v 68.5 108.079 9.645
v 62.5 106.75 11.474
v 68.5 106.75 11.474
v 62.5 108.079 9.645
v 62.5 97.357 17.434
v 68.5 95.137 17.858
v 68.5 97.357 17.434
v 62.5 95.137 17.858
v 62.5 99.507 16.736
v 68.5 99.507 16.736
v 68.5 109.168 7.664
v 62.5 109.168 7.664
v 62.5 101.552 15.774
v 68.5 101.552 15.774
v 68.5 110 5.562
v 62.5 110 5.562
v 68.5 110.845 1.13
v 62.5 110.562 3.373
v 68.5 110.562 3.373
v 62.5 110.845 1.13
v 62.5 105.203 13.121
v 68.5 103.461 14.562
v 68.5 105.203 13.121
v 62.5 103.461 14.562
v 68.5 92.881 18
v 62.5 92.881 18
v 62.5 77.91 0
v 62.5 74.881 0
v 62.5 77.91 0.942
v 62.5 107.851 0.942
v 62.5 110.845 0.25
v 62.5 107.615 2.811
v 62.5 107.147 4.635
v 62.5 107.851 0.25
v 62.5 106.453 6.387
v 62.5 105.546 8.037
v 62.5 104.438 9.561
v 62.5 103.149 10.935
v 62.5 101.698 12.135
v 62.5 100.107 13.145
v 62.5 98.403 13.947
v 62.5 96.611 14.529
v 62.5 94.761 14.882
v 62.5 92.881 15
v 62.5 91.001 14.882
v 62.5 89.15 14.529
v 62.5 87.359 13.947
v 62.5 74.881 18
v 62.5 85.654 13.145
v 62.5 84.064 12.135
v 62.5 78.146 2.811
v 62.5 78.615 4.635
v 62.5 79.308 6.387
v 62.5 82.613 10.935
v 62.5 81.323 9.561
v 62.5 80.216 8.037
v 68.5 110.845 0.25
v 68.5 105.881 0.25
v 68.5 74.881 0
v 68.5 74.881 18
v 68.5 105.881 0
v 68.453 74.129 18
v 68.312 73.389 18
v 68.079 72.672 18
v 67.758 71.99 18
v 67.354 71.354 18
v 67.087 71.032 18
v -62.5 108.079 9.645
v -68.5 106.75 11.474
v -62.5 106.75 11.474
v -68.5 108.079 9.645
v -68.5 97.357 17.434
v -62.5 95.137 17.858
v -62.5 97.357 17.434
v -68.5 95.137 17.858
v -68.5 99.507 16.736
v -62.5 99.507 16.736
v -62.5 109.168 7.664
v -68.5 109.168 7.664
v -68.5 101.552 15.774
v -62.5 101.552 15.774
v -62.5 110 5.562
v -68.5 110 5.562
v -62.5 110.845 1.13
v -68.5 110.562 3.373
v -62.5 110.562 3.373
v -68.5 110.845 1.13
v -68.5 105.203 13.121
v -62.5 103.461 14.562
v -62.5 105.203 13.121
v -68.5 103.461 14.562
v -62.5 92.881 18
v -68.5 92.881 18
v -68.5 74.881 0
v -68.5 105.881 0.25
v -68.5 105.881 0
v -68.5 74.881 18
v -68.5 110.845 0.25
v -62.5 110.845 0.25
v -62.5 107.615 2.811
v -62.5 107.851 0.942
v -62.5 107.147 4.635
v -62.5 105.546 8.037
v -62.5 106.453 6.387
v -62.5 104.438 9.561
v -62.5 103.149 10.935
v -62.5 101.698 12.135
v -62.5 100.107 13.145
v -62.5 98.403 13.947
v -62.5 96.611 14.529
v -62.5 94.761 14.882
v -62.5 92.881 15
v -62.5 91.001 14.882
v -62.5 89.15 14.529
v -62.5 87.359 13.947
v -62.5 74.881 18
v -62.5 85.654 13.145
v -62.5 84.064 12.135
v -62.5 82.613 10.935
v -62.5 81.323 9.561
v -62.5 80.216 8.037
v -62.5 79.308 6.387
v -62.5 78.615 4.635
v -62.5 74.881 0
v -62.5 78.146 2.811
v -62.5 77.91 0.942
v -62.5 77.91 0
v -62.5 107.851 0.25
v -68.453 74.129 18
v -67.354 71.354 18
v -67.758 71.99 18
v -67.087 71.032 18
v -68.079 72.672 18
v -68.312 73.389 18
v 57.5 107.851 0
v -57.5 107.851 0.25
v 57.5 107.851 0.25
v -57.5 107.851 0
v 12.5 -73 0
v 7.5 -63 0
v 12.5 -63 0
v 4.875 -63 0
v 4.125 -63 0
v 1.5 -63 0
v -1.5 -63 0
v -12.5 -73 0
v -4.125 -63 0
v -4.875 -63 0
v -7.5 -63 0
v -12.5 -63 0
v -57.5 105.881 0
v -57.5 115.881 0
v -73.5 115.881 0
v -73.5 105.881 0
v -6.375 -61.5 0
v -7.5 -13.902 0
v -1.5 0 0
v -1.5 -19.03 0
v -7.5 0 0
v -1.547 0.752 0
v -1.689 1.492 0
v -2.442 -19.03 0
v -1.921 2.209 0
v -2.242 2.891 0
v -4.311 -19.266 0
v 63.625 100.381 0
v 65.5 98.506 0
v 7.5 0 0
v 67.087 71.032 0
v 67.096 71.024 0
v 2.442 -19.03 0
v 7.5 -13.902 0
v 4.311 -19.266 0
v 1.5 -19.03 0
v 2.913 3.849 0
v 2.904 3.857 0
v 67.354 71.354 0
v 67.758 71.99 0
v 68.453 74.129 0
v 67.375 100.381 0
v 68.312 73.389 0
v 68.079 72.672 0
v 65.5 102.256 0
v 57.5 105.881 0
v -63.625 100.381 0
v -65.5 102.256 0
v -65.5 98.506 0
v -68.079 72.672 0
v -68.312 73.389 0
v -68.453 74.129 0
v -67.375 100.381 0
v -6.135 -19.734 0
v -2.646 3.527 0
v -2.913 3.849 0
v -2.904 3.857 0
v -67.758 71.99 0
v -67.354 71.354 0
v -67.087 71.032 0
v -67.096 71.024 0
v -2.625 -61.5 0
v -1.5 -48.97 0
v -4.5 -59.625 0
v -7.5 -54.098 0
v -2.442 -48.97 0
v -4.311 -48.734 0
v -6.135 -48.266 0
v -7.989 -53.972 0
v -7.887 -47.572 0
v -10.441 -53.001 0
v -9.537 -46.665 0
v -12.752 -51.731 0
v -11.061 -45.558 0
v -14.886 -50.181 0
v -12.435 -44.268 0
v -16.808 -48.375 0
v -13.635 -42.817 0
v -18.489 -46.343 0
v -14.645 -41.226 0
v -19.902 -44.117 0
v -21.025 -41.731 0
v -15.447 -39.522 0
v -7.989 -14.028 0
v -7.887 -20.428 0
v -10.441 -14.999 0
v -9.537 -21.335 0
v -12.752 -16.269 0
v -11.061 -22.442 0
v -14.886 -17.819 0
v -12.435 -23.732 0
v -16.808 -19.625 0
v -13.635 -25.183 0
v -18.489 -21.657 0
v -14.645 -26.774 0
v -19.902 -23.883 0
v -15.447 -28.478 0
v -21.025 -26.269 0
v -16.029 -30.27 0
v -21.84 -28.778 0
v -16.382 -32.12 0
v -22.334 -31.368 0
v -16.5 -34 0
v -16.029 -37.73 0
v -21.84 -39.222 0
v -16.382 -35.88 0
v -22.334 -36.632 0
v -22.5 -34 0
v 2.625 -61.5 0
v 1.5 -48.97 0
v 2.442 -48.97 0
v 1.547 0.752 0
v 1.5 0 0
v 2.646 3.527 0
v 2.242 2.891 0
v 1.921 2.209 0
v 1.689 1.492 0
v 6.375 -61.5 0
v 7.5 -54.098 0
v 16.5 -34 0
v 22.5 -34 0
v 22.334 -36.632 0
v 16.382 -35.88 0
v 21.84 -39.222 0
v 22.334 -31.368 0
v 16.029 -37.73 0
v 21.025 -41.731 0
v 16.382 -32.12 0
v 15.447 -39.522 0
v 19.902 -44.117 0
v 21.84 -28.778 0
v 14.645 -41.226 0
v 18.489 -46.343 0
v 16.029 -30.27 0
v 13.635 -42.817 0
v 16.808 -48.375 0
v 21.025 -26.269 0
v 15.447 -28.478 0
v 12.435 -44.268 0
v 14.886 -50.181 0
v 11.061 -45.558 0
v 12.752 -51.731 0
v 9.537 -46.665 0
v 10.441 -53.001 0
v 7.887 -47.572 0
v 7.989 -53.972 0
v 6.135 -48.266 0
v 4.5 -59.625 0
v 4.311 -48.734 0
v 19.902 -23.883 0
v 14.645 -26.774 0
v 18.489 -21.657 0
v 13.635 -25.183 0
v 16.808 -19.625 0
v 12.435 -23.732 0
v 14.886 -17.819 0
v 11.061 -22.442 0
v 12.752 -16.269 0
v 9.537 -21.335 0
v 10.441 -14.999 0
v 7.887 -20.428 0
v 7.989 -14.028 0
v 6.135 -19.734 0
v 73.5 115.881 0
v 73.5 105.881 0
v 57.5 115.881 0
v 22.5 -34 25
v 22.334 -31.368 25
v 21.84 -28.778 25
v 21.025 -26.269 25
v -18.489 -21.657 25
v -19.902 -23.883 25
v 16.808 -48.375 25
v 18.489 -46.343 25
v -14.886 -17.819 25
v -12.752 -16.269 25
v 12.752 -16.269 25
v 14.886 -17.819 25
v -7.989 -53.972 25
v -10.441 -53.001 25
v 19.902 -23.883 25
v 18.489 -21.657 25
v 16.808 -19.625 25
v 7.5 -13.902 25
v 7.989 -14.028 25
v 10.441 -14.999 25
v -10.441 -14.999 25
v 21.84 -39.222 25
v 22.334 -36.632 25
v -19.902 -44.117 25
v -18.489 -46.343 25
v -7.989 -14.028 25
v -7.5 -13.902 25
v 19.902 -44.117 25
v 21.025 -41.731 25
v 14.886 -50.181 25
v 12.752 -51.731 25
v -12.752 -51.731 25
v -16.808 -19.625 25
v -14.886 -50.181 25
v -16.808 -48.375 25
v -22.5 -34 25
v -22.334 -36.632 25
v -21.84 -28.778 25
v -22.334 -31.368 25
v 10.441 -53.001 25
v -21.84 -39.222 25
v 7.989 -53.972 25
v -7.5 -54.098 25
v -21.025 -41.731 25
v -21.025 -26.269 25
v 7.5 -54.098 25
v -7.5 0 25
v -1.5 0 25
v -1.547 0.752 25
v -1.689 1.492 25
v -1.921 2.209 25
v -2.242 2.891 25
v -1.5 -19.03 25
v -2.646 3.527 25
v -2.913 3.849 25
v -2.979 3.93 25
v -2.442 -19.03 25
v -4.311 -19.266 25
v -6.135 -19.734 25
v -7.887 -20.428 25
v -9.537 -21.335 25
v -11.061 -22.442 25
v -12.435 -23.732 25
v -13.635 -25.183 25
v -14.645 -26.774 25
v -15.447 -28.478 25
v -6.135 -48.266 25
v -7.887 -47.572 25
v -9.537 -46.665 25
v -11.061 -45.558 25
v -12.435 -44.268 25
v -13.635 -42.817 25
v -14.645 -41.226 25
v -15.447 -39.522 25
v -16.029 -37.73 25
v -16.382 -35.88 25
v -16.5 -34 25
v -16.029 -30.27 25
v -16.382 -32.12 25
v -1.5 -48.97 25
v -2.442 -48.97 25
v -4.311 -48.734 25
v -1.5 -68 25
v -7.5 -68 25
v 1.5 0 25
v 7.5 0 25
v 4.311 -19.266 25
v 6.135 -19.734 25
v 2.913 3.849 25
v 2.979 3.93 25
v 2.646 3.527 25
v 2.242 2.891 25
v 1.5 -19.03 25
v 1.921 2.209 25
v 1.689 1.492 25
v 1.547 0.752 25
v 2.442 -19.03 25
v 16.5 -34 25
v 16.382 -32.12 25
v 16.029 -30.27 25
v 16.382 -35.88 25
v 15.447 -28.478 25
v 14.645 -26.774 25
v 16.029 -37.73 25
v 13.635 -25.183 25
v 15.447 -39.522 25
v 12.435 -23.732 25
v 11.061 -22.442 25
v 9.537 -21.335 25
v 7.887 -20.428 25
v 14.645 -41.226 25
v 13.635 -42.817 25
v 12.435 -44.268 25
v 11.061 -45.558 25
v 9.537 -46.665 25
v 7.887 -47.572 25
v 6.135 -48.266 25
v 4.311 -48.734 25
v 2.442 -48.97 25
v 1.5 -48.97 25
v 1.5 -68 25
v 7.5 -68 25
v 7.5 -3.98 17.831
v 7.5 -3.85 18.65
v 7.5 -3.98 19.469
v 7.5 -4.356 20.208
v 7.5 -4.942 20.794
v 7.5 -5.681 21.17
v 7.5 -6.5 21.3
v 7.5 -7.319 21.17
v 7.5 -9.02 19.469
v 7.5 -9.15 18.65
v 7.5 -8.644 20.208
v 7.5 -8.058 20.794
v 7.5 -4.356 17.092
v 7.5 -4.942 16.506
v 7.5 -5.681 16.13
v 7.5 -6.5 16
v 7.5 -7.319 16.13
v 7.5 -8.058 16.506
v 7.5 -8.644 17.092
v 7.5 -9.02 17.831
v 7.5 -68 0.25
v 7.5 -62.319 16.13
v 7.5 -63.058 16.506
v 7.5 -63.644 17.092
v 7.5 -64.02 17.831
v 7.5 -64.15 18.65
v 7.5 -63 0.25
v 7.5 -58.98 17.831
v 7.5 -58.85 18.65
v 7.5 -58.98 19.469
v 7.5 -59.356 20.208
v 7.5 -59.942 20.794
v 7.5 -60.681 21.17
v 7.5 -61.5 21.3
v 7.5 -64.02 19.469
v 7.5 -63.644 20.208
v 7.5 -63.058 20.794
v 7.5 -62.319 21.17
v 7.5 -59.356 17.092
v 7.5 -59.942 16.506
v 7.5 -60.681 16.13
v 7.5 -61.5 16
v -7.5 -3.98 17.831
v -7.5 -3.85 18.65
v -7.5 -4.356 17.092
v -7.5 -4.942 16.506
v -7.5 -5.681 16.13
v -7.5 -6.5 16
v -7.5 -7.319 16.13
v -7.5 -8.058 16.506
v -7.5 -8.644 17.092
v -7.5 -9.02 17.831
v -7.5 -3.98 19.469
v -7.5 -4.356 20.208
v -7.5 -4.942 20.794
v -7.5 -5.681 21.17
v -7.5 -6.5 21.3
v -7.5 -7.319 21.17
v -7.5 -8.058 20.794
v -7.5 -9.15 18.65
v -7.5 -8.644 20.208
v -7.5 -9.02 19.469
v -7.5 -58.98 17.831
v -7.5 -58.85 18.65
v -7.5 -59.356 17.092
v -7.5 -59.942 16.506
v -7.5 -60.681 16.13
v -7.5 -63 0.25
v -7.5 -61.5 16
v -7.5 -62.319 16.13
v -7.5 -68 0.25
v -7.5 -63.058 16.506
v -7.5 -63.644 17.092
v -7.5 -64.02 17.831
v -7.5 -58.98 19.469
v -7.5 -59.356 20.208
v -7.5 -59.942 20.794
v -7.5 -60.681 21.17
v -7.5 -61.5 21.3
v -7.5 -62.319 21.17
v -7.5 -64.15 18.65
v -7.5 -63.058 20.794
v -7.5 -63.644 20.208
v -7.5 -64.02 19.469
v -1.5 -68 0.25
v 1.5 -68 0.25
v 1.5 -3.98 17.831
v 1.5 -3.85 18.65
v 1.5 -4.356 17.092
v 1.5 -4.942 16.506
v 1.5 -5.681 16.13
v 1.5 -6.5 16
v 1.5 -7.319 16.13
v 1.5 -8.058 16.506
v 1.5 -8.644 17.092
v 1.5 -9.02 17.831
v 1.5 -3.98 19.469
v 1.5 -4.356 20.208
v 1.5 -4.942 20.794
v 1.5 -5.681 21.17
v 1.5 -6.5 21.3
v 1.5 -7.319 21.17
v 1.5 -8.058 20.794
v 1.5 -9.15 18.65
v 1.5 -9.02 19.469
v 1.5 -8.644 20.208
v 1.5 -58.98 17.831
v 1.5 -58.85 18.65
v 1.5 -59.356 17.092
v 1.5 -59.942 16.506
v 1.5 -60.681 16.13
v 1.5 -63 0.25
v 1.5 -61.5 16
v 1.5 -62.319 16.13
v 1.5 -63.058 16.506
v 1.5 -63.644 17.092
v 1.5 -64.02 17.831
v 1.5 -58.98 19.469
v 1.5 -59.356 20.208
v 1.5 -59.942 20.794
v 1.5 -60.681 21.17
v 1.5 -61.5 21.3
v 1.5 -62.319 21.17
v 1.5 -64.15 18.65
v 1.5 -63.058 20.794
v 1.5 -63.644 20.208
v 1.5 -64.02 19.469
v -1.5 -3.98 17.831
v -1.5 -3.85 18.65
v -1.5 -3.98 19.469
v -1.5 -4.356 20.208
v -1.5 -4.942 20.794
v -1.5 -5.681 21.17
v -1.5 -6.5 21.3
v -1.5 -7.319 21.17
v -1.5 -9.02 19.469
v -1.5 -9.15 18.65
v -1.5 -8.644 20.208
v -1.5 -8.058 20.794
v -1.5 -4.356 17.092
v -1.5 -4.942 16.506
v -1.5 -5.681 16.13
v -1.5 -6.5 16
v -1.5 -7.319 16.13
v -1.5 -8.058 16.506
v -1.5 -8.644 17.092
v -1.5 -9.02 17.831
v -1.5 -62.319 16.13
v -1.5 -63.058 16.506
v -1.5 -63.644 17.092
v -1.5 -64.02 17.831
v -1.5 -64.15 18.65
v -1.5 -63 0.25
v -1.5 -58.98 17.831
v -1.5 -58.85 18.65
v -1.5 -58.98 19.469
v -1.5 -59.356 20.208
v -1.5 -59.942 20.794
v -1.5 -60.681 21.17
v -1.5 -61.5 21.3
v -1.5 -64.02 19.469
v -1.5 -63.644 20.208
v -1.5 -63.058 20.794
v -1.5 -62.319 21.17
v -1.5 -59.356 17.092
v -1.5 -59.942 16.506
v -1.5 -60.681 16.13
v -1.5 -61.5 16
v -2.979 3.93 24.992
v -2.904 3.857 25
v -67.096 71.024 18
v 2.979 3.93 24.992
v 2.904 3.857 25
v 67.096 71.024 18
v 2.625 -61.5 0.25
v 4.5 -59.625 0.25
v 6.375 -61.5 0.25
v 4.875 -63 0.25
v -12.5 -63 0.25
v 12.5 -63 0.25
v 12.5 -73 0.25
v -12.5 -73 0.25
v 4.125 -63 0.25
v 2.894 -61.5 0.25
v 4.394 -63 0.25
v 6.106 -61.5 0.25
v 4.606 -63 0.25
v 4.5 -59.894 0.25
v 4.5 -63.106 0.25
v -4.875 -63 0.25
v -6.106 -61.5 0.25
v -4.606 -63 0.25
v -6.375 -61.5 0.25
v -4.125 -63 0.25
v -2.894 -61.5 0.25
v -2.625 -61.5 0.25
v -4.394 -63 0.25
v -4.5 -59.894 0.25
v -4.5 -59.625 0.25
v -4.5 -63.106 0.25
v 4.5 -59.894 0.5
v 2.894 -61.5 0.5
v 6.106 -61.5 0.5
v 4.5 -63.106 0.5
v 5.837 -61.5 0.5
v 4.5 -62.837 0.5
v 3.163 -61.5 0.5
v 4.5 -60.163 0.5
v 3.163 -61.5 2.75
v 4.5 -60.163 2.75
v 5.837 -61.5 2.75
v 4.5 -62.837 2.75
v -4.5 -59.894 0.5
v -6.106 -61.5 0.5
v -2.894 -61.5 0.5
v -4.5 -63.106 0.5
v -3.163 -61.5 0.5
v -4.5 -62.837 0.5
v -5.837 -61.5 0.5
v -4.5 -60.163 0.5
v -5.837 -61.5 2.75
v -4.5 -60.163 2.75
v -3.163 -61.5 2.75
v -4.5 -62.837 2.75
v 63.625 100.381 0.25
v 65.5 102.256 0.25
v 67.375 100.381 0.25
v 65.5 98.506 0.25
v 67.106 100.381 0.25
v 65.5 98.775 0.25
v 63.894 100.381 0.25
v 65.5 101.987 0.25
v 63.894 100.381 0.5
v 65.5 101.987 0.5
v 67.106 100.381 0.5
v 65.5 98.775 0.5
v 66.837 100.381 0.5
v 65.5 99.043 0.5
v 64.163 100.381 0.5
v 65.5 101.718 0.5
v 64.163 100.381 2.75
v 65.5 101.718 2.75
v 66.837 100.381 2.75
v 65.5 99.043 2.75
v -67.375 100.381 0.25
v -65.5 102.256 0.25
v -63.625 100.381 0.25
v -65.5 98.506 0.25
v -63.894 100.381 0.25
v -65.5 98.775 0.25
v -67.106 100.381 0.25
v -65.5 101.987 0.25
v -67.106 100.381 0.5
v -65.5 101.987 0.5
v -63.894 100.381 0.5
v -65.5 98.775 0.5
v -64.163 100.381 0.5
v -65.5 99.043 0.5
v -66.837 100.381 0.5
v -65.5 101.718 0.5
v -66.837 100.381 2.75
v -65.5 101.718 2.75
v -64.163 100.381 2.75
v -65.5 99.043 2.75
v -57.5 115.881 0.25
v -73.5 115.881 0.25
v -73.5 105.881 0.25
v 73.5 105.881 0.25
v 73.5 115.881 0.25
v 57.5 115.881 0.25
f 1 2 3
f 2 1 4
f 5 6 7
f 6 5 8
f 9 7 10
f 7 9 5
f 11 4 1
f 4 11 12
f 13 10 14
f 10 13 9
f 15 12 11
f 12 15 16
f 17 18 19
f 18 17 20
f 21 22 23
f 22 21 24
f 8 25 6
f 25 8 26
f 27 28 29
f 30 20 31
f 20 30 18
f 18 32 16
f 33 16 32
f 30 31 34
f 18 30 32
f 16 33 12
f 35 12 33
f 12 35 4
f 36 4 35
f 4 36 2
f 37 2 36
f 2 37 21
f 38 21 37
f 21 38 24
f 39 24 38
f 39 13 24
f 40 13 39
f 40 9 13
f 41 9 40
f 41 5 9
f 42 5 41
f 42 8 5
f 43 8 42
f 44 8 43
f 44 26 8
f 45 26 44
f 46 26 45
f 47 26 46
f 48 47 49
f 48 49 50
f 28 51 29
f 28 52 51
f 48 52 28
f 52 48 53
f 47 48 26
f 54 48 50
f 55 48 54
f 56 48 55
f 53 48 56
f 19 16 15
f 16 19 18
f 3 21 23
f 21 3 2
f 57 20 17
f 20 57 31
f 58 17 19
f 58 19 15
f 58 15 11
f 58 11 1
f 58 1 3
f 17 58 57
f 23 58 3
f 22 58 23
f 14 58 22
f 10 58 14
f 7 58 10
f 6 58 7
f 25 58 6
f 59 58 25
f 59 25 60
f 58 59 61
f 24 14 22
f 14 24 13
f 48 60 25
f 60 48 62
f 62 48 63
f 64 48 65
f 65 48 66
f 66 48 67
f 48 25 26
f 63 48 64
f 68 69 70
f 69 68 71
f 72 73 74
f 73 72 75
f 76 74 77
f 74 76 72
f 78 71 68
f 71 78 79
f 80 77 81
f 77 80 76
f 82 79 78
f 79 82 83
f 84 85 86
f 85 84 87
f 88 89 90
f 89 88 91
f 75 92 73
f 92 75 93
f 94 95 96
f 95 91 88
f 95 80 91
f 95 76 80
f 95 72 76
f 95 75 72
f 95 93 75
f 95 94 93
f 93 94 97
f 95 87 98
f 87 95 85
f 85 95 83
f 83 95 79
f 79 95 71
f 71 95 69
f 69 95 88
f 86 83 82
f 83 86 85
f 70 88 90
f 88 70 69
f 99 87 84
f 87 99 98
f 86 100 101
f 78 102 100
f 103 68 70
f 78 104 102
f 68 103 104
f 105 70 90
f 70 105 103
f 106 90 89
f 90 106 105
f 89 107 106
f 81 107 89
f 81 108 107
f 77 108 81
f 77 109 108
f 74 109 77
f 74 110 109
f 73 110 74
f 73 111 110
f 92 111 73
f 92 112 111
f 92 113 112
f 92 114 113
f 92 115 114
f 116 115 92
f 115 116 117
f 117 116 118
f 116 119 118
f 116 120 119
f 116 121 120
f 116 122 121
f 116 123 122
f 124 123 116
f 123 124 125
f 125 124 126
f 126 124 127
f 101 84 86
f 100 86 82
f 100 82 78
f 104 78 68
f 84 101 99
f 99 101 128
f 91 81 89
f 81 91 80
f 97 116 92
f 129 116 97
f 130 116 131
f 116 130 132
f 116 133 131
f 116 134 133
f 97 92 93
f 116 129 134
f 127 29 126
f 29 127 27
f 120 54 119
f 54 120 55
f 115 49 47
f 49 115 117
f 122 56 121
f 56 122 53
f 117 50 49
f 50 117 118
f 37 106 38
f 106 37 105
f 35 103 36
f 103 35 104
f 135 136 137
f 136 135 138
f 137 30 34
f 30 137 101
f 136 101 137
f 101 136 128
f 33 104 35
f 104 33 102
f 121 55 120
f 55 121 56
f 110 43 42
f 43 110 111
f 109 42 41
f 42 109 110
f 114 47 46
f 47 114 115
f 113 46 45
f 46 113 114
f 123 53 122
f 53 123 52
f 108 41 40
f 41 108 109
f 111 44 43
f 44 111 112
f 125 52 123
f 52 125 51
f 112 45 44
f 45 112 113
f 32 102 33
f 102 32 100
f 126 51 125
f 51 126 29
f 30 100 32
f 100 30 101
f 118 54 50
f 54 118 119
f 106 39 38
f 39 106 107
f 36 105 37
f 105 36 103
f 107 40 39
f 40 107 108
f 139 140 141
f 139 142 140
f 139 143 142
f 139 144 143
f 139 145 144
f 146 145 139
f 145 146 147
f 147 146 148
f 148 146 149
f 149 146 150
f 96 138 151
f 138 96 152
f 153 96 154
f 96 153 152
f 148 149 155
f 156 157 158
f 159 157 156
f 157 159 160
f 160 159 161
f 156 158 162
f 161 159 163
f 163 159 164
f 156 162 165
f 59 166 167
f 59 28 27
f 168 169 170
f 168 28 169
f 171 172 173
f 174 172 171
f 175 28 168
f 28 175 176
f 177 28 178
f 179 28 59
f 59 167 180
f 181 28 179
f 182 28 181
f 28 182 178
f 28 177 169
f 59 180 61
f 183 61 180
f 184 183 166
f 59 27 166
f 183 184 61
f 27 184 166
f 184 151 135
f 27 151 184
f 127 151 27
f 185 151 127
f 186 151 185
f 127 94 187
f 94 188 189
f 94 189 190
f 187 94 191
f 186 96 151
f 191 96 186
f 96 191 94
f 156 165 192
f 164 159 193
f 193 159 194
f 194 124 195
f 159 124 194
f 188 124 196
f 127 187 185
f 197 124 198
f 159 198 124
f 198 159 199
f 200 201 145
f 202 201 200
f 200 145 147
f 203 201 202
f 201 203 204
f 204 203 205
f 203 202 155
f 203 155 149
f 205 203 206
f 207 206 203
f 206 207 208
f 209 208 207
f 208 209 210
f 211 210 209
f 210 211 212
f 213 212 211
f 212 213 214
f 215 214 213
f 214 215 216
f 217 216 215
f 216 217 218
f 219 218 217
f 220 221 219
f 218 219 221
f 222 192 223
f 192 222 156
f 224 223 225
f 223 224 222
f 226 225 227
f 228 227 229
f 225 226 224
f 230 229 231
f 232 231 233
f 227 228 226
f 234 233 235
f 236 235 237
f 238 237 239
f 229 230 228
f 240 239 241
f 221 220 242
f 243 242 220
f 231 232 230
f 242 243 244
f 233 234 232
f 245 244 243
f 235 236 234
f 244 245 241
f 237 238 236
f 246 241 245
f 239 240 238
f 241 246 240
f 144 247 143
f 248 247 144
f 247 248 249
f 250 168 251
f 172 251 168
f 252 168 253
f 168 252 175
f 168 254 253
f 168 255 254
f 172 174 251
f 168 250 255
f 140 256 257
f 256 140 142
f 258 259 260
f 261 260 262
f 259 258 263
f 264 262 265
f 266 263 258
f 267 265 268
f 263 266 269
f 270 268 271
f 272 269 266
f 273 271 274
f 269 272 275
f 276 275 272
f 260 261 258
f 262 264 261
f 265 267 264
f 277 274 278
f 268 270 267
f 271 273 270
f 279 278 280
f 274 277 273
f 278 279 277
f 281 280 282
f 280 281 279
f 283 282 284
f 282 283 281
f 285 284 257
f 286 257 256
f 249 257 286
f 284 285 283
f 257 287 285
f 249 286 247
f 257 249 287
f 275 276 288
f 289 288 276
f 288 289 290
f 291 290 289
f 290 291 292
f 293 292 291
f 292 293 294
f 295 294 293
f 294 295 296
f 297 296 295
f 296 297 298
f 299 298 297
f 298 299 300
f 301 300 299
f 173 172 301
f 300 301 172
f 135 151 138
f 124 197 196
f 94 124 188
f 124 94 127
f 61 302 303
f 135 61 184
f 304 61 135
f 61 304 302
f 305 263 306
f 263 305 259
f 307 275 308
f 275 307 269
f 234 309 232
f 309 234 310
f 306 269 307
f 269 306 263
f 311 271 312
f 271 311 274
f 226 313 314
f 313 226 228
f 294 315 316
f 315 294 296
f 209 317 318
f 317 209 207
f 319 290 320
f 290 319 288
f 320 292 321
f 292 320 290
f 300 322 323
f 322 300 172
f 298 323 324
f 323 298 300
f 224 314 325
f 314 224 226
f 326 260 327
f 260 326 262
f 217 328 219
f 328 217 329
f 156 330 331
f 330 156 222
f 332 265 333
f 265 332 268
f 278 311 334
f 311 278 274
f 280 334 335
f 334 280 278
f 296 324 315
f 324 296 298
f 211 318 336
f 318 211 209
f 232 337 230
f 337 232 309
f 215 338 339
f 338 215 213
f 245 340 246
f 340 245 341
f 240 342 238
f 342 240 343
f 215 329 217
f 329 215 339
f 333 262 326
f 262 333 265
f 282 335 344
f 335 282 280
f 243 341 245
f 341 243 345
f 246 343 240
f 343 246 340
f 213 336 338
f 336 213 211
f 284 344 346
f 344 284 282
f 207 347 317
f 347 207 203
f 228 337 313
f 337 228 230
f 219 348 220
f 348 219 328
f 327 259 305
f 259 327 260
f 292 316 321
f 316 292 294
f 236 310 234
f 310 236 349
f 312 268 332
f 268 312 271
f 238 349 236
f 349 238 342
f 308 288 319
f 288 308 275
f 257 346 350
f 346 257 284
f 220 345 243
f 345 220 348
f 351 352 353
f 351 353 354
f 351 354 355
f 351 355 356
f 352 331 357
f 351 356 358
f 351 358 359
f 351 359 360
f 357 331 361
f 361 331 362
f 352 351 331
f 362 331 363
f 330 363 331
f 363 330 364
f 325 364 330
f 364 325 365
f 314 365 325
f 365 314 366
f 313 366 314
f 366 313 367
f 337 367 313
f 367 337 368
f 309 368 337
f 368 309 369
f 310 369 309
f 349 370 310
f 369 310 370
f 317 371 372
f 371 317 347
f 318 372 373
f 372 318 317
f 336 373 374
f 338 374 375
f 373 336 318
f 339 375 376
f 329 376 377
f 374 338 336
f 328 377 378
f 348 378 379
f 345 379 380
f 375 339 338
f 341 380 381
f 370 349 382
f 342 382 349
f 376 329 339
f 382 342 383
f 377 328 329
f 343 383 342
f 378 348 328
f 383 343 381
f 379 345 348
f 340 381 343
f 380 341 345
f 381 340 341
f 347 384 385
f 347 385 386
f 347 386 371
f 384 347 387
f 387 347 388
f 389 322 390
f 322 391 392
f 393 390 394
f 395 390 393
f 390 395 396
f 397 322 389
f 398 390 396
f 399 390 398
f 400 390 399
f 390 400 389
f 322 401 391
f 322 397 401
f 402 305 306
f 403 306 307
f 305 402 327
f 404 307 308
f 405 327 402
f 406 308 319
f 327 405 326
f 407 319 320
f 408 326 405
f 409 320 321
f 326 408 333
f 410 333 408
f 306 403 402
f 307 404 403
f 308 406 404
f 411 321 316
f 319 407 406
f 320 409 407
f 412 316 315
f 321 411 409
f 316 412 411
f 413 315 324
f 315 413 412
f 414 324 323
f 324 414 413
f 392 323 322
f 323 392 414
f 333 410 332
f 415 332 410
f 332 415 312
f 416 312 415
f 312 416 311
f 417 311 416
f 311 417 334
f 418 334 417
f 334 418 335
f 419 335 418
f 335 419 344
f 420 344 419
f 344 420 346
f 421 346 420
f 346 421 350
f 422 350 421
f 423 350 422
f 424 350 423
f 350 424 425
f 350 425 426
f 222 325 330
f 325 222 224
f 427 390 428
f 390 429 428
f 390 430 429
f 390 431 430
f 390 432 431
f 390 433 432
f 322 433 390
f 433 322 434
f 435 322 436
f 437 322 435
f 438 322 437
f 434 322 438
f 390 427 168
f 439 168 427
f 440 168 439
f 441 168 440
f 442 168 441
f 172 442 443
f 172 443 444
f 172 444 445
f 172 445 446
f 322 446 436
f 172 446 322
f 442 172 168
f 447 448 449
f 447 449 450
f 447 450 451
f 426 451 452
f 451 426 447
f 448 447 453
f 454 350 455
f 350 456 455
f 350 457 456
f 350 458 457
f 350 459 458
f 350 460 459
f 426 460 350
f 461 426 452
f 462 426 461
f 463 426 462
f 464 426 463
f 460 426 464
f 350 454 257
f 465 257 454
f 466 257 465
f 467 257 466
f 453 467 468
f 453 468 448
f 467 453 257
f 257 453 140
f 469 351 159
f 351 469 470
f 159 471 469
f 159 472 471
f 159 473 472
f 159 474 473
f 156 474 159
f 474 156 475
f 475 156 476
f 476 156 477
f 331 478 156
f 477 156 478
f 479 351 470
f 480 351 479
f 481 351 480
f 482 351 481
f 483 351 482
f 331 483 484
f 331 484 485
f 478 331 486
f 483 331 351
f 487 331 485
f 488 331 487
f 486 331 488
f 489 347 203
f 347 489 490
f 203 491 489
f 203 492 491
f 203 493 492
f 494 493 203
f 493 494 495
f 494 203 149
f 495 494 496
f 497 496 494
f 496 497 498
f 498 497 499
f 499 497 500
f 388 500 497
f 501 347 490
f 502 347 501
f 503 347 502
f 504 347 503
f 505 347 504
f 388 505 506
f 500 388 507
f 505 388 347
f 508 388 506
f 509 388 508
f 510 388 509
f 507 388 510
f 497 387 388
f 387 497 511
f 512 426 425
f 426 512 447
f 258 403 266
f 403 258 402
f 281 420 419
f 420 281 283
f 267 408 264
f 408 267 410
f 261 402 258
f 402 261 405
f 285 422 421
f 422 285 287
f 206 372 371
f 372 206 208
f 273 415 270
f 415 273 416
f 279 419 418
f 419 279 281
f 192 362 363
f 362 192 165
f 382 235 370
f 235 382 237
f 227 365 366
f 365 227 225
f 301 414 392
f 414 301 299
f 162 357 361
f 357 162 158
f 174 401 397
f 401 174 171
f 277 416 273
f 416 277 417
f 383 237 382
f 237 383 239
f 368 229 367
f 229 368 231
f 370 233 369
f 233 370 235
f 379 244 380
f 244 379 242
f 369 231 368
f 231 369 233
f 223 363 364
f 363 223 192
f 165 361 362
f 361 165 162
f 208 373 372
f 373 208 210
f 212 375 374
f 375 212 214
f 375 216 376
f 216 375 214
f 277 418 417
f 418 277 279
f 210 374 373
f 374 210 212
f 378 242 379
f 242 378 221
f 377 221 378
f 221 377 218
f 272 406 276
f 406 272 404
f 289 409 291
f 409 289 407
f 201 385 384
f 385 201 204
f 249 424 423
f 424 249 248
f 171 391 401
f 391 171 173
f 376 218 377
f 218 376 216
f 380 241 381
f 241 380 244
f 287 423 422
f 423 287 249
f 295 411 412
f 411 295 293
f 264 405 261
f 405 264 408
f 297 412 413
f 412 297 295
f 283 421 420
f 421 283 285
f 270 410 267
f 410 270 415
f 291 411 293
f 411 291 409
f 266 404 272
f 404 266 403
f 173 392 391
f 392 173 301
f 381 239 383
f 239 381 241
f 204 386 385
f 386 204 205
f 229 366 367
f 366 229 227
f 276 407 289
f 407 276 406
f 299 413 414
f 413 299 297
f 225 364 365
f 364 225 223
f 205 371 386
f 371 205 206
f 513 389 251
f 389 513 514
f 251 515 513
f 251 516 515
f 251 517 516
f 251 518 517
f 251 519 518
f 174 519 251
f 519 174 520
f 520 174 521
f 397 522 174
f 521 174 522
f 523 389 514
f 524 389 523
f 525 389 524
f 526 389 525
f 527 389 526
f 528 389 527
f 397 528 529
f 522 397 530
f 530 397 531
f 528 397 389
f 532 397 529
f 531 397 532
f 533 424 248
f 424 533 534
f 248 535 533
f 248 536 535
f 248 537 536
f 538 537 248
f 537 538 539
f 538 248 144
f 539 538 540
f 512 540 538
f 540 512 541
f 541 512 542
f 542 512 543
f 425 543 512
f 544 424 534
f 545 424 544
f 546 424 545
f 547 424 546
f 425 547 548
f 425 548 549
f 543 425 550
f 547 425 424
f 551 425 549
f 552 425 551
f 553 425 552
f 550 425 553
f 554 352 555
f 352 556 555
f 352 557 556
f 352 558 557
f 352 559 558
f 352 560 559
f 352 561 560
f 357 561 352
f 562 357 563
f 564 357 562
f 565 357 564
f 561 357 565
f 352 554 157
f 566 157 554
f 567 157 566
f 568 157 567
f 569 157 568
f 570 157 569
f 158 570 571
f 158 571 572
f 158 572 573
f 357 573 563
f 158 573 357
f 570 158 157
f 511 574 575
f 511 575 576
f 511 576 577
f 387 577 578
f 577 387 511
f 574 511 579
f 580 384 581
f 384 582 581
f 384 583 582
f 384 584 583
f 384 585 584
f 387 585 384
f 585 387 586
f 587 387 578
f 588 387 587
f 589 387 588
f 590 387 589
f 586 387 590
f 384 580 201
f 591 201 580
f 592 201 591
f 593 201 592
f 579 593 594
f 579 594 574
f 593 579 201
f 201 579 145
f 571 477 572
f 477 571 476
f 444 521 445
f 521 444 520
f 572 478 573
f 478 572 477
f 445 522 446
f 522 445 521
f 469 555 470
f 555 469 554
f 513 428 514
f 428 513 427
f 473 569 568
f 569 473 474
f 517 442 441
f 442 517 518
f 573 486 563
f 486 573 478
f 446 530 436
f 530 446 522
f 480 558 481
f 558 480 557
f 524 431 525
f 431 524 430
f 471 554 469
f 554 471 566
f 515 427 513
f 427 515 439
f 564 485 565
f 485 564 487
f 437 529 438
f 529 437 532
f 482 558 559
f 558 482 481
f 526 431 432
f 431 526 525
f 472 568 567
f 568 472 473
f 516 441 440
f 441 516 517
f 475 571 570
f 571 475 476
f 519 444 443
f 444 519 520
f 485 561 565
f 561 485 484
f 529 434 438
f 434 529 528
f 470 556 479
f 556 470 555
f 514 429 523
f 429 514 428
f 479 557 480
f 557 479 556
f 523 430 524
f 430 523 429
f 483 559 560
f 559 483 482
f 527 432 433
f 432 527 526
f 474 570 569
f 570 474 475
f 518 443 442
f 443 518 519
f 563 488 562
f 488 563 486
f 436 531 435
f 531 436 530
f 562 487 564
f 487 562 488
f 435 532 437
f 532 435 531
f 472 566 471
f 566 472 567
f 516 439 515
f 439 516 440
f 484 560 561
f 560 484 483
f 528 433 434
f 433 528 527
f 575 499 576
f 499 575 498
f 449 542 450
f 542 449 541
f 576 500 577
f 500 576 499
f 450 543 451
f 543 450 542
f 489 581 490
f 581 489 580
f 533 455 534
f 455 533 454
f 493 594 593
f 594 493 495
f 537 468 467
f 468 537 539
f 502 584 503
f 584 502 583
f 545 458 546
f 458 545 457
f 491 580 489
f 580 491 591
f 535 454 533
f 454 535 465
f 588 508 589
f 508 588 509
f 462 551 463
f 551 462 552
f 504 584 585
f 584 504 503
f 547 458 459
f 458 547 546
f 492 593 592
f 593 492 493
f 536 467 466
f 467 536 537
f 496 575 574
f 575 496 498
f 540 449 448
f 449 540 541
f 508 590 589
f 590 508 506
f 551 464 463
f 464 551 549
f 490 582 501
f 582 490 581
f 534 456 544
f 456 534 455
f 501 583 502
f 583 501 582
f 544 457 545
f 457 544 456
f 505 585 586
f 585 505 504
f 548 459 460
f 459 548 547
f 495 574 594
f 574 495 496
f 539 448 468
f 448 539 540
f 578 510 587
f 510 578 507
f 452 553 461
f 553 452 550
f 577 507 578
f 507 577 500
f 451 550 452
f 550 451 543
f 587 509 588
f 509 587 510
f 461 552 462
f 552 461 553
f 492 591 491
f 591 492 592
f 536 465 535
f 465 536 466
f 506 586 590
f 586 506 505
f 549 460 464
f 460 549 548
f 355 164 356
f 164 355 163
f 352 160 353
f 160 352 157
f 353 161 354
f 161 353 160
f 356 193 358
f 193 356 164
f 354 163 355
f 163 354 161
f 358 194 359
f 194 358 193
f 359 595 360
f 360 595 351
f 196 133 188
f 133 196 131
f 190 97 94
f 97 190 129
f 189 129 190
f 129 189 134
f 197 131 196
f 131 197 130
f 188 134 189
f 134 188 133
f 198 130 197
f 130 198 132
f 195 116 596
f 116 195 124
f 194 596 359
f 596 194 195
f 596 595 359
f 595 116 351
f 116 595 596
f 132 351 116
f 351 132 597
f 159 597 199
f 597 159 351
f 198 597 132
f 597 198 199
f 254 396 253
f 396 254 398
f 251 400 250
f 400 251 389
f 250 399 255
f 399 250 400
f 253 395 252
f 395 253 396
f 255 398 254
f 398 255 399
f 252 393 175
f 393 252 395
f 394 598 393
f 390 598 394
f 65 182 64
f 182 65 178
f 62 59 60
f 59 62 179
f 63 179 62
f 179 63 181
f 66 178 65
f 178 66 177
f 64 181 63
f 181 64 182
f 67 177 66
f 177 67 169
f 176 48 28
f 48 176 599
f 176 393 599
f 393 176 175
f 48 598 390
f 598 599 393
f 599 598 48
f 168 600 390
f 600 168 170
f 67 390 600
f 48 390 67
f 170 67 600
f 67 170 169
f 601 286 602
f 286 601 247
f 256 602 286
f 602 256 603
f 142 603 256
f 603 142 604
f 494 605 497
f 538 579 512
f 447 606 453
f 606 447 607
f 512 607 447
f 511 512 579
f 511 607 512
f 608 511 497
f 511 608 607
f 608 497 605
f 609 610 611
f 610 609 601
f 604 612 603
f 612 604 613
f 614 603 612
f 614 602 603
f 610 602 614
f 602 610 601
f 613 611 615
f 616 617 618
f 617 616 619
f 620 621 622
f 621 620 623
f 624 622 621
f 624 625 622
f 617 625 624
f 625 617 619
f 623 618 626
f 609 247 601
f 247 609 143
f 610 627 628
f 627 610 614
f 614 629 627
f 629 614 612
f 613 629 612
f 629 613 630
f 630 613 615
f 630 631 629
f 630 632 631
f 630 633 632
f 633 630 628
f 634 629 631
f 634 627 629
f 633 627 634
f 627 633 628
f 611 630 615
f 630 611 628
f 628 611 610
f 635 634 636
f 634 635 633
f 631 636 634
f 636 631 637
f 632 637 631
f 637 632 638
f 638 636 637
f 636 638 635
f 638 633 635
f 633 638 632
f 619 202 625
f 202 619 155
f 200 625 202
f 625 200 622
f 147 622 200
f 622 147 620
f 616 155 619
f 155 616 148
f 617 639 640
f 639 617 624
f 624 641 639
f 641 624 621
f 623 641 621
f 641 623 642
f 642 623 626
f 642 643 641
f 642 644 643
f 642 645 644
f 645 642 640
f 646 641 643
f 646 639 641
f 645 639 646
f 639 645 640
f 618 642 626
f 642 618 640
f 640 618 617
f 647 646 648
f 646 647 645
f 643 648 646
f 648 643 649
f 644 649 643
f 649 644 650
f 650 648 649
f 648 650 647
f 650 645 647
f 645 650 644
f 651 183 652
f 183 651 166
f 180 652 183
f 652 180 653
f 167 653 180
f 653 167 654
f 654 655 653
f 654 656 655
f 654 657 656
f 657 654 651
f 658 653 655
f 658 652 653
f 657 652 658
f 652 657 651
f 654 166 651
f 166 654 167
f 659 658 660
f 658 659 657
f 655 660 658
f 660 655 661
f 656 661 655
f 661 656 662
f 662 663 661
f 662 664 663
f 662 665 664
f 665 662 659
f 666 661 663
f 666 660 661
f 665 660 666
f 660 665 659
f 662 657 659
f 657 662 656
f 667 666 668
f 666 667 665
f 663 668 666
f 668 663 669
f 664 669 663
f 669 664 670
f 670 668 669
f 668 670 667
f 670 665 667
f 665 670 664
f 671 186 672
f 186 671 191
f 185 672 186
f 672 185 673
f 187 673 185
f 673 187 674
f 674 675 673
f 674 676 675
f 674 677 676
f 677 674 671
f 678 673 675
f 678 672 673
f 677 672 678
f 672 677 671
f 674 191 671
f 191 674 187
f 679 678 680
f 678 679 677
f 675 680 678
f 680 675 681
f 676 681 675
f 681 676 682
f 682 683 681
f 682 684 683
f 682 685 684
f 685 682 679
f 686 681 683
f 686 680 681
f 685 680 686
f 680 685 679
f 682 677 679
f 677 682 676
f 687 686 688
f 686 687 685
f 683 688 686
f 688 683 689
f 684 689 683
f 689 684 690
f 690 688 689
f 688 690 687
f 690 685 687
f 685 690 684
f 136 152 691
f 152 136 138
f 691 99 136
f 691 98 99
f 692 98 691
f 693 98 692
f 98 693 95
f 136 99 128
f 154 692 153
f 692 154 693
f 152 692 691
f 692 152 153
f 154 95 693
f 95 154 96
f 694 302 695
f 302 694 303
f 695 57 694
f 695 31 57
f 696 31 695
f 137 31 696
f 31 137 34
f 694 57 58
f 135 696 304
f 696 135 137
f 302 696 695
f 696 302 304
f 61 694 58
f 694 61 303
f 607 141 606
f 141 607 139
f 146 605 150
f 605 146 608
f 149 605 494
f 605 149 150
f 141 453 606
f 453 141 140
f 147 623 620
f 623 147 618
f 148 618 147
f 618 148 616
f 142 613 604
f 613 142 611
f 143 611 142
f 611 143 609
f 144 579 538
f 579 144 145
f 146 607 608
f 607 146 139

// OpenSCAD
// [FL_INDEX: keywords="openscad, 3d_parametric, Side_handle_for_snow_shovel, csg_solid" | COT="Parametric OpenSCAD design from 3DCodeverse"]
// Title: Side handle for snow shovel

/* [General] */

// "whole" gives you the entire part, to be printed as a piece. It can be difficult to print. "split" gives you the top half of the part, for you to print twice and glue together.
layout = "split"; // [whole, split]

// Thickness of all the walls except the handle cylinder.
wall_thickness = 6;

// Specify the diameter of your filament. Holes are provided for alignment pins to aid in gluing, if printing in halves. Put in pieces of filament in the alignment holes to help you glue the halves. If you're going to do this, measure your filament.
pin_diameter = 1.75;

// Extra clearance for alignment pins.
hole_clearance = 0.1;

// Also need to know the layer height you are printing at.
layer_height = 0.25;

// And the extrusion width.
extrusion_width = 0.38;

/* [Handle] */
handle_length = 125;
handle_outer_diameter = 30;

// Determines size of hole in handle. If you don't want a hole in the handle, make this greater than or equal to handle_outer_diameter / 2.
handle_wall_thickness = 15;

// Set this to zero to require fewer supports if printing as one piece.
handle_flange_border = 3;

/* [Clamp] */
// Diameter of the thing you're going to be clamping onto.
clamp_inner_diameter = 30;

// Setting clamp_length to handle_outer_diameter + 2*handle_flange_border will reduce the number of supports required.
clamp_length = 50; 

// Resting distance between the clamps. Don't make this too big, or you won't be able to bring the clamps together properly. Too small, though, and you may not be able to get it around your object. Partly depends on the material you are using, and the wall thickness you have chosen.
clamp_gap = 3;

// #10 screws
screw_od = 5.1;

// and #10 washers
washer_od = 12.7;

// Allow enough space to fit your washers. Wing nut screws may require some more clearance.
clamp_flange_length = 13;

// Angle from vertical for the sidewalls.
side_angle = 40;

/* [Hidden] */
// To avoid coincident faces.
slop = 1;
$fn = 50;
clamp_outer_diameter = clamp_inner_diameter + 2 * wall_thickness;


module screw() {
    rotate([0, 90, 0])
    cylinder(r = screw_od/2 + hole_clearance, h = clamp_gap + 2*wall_thickness + 2*slop, center = true, $fn = 20);
}

module clamp() {
  screw_z = clamp_length/2 - washer_od/2;
  screw_y = clamp_inner_diameter/2 + wall_thickness + clamp_flange_length / 2;

  difference() {
    union() {
      // Clamp outside shell
      hull() {
        translate([-clamp_gap/2, 0, 0])
        cylinder(h = clamp_length, r = clamp_outer_diameter/2, center = true);

        translate([clamp_gap/2, 0, 0])
        cylinder(h = clamp_length, r = clamp_outer_diameter/2, center = true);
      }

      // Flange
      cube([clamp_gap + 2*wall_thickness, clamp_outer_diameter + 2*clamp_flange_length, clamp_length], center = true);
    }
    // Clamp hole
    hull() {
      translate([-clamp_gap/2, 0, 0])
      cylinder(h = clamp_length + slop, r = clamp_inner_diameter/2, center = true);

      translate([clamp_gap/2, 0, 0])
      cylinder(h = clamp_length + slop, r = clamp_inner_diameter/2, center = true);
    }

    // Gap
    cube([clamp_gap, clamp_outer_diameter + 2*clamp_flange_length + slop, clamp_length + slop], center = true);

    // Screw holes
    translate([0, screw_y, screw_z]) screw();
    translate([0, screw_y, -screw_z]) screw();    
    translate([0, -screw_y, screw_z]) screw();
    translate([0, -screw_y, -screw_z]) screw();
  }
}

handle_flange_length = handle_outer_diameter + 2*handle_flange_border;

module handle_flange() {
  cylinder(h = wall_thickness, r = handle_flange_length/2);

  translate([-handle_flange_length/2, -handle_flange_length/2, 0])
  cube([handle_flange_length, handle_flange_length/2, wall_thickness]);
}

module handle() {
  translate([0, handle_flange_length/2, 0])
  rotate([0, 90, 0])
  difference() {
    union() {
      // Handle outer shell
      cylinder(h = handle_length, r = handle_outer_diameter/2, center = true);

      // Flanges
      translate([0, 0, handle_length/2])
      handle_flange();

      translate([0, 0, -handle_length/2 - wall_thickness])
      handle_flange();
    }
    cylinder(h = handle_length + 2*wall_thickness + slop, r = handle_outer_diameter/2 - handle_wall_thickness, center = true);
    cube([handle_outer_diameter + 2*wall_thickness, ]);
  }
}

// We want the side walls to coincide with the outside corner of the clamp, but the inside corner of the handle.
// Math is hard.
W = wall_thickness / cos(side_angle);
x = W - wall_thickness;
clamp_y_intercept = (handle_length - clamp_gap) / 2 / tan(side_angle) + x / tan(side_angle);

//Title: Wedge Module
//Author: Alex English - ProtoParadigm
//Date: 1/4/2013
//License: Creative Commons - Share Alike - Attribution

//Usage: Include in your other .scad projects and call wedge with arguments for the height of the wedge, the radius of the wedge, and the angle of the wedge in degrees.  The resulting wedge will be placed with the point at the origin, extending into the z axis, with the angle starting at the x axis and extending counter-clockwise as per the right-hand rule.

//Updated: 1/12/2013 - Increased dimensions of wedge to be revoved when angle is more than 180 as per suggestion from kitwallace.

module wedge_180(h, r, d)
{
  rotate(d) difference()
  {
    rotate(180-d) difference()
    {
      cylinder(h = h, r = r);
      translate([-(r+1), 0, -1]) cube([r*2+2, r+1, h+2]);
    }
    translate([-(r+1), 0, -1]) cube([r*2+2, r+1, h+2]);
  }
}

module wedge(h, r, d)
{
  if(d <= 180)
    wedge_180(h, r, d);
  else
    rotate(d) difference()
    {
      cylinder(h = h, r = r);
      translate([0, 0, -1]) wedge_180(h+2, r+1, 360-d);
    }
}

module side_wall() {
  side_length = clamp_y_intercept / cos(side_angle) - W * sin(side_angle);

  translate([-handle_length/2, clamp_y_intercept])
  rotate([90, 0, -(90 - side_angle)])
  linear_extrude(height = wall_thickness)
  polygon([
    [0, handle_flange_length/2],
    [side_length, clamp_length/2],
    [side_length, -clamp_length/2],
    [0, -handle_flange_length/2]
  ]);

  translate([-clamp_gap/2 - wall_thickness, 0, -clamp_length/2])
  wedge(h = clamp_length, r = wall_thickness, d = side_angle + 1);

  translate([-handle_length/2, clamp_y_intercept, -handle_flange_length/2])
  rotate([0, 0, 180])
  wedge(h = handle_flange_length, r = wall_thickness, d = side_angle + 1);
}

//-- Locating pin hole with glue recess
// http://softsolder.com/2013/11/12/improved-alignment-pin-hole-for-split-3d-prints/ 

module PolyCyl(Dia,Height,ForceSides=0) {           // based on nophead's polyholes
  Sides = (ForceSides != 0) ? ForceSides : (ceil(Dia) + 2);
  FixDia = Dia / cos(180/Sides);
  cylinder(r=FixDia/2 + hole_clearance,
           h=Height,
           $fn=Sides);
}

module LocatingPin(Dia=pin_diameter,Len=5.00) {
   
  translate([0,0,-layer_height])
  PolyCyl((Dia + 2*extrusion_width),2*layer_height,4);
   
  translate([0,0,-2*layer_height])
  PolyCyl((Dia + 1*extrusion_width),4*layer_height,4);
   
  translate([0,0,-(Len/2 + layer_height)])
  PolyCyl(Dia,(Len + 2*layer_height),4);
}

module part() {
  translate([0, clamp_y_intercept, 0])
  handle();

  translate([0, -clamp_outer_diameter/2 - clamp_flange_length, 0])
  clamp();

  side_wall();
  mirror([1, 0, 0]) side_wall();
}

module tabs() {
  top_left_y = clamp_y_intercept + handle_flange_length;
  top_left_x = -handle_length/2 - wall_thickness;

  translate([top_left_x - 5, top_left_y - 5, 0])
  cube([10 + wall_thickness, 10, layer_height]);

  translate([handle_length/2 - 5, top_left_y - 5, 0])
  cube([10 + wall_thickness, 10, layer_height]);

  translate([-(clamp_gap/2 + wall_thickness + 5), -(2*clamp_flange_length + 2*wall_thickness + clamp_inner_diameter + 5), 0])
  cube([10 + 2*wall_thickness + clamp_gap, 10, layer_height]);
}

module split() {
  difference() {
    part();
    translate([-200, -200, -100])
    cube([400, 400, 100]);

    translate([clamp_gap/2 + wall_thickness/2, -(1.5*clamp_flange_length + 2*wall_thickness + clamp_inner_diameter)])
    LocatingPin();

    translate([-(clamp_gap/2 + wall_thickness/2), -(1.5*clamp_flange_length + 2*wall_thickness + clamp_inner_diameter)])
    LocatingPin();

    translate([(handle_length + wall_thickness)/2, clamp_y_intercept + handle_flange_length - handle_flange_border - handle_wall_thickness/2, 0])
    LocatingPin();

    translate([-(handle_length + wall_thickness)/2, clamp_y_intercept + handle_flange_length - handle_flange_border - handle_wall_thickness/2, 0])
    LocatingPin();
  }
  tabs();
}

if (layout == "whole") part();
else split();
